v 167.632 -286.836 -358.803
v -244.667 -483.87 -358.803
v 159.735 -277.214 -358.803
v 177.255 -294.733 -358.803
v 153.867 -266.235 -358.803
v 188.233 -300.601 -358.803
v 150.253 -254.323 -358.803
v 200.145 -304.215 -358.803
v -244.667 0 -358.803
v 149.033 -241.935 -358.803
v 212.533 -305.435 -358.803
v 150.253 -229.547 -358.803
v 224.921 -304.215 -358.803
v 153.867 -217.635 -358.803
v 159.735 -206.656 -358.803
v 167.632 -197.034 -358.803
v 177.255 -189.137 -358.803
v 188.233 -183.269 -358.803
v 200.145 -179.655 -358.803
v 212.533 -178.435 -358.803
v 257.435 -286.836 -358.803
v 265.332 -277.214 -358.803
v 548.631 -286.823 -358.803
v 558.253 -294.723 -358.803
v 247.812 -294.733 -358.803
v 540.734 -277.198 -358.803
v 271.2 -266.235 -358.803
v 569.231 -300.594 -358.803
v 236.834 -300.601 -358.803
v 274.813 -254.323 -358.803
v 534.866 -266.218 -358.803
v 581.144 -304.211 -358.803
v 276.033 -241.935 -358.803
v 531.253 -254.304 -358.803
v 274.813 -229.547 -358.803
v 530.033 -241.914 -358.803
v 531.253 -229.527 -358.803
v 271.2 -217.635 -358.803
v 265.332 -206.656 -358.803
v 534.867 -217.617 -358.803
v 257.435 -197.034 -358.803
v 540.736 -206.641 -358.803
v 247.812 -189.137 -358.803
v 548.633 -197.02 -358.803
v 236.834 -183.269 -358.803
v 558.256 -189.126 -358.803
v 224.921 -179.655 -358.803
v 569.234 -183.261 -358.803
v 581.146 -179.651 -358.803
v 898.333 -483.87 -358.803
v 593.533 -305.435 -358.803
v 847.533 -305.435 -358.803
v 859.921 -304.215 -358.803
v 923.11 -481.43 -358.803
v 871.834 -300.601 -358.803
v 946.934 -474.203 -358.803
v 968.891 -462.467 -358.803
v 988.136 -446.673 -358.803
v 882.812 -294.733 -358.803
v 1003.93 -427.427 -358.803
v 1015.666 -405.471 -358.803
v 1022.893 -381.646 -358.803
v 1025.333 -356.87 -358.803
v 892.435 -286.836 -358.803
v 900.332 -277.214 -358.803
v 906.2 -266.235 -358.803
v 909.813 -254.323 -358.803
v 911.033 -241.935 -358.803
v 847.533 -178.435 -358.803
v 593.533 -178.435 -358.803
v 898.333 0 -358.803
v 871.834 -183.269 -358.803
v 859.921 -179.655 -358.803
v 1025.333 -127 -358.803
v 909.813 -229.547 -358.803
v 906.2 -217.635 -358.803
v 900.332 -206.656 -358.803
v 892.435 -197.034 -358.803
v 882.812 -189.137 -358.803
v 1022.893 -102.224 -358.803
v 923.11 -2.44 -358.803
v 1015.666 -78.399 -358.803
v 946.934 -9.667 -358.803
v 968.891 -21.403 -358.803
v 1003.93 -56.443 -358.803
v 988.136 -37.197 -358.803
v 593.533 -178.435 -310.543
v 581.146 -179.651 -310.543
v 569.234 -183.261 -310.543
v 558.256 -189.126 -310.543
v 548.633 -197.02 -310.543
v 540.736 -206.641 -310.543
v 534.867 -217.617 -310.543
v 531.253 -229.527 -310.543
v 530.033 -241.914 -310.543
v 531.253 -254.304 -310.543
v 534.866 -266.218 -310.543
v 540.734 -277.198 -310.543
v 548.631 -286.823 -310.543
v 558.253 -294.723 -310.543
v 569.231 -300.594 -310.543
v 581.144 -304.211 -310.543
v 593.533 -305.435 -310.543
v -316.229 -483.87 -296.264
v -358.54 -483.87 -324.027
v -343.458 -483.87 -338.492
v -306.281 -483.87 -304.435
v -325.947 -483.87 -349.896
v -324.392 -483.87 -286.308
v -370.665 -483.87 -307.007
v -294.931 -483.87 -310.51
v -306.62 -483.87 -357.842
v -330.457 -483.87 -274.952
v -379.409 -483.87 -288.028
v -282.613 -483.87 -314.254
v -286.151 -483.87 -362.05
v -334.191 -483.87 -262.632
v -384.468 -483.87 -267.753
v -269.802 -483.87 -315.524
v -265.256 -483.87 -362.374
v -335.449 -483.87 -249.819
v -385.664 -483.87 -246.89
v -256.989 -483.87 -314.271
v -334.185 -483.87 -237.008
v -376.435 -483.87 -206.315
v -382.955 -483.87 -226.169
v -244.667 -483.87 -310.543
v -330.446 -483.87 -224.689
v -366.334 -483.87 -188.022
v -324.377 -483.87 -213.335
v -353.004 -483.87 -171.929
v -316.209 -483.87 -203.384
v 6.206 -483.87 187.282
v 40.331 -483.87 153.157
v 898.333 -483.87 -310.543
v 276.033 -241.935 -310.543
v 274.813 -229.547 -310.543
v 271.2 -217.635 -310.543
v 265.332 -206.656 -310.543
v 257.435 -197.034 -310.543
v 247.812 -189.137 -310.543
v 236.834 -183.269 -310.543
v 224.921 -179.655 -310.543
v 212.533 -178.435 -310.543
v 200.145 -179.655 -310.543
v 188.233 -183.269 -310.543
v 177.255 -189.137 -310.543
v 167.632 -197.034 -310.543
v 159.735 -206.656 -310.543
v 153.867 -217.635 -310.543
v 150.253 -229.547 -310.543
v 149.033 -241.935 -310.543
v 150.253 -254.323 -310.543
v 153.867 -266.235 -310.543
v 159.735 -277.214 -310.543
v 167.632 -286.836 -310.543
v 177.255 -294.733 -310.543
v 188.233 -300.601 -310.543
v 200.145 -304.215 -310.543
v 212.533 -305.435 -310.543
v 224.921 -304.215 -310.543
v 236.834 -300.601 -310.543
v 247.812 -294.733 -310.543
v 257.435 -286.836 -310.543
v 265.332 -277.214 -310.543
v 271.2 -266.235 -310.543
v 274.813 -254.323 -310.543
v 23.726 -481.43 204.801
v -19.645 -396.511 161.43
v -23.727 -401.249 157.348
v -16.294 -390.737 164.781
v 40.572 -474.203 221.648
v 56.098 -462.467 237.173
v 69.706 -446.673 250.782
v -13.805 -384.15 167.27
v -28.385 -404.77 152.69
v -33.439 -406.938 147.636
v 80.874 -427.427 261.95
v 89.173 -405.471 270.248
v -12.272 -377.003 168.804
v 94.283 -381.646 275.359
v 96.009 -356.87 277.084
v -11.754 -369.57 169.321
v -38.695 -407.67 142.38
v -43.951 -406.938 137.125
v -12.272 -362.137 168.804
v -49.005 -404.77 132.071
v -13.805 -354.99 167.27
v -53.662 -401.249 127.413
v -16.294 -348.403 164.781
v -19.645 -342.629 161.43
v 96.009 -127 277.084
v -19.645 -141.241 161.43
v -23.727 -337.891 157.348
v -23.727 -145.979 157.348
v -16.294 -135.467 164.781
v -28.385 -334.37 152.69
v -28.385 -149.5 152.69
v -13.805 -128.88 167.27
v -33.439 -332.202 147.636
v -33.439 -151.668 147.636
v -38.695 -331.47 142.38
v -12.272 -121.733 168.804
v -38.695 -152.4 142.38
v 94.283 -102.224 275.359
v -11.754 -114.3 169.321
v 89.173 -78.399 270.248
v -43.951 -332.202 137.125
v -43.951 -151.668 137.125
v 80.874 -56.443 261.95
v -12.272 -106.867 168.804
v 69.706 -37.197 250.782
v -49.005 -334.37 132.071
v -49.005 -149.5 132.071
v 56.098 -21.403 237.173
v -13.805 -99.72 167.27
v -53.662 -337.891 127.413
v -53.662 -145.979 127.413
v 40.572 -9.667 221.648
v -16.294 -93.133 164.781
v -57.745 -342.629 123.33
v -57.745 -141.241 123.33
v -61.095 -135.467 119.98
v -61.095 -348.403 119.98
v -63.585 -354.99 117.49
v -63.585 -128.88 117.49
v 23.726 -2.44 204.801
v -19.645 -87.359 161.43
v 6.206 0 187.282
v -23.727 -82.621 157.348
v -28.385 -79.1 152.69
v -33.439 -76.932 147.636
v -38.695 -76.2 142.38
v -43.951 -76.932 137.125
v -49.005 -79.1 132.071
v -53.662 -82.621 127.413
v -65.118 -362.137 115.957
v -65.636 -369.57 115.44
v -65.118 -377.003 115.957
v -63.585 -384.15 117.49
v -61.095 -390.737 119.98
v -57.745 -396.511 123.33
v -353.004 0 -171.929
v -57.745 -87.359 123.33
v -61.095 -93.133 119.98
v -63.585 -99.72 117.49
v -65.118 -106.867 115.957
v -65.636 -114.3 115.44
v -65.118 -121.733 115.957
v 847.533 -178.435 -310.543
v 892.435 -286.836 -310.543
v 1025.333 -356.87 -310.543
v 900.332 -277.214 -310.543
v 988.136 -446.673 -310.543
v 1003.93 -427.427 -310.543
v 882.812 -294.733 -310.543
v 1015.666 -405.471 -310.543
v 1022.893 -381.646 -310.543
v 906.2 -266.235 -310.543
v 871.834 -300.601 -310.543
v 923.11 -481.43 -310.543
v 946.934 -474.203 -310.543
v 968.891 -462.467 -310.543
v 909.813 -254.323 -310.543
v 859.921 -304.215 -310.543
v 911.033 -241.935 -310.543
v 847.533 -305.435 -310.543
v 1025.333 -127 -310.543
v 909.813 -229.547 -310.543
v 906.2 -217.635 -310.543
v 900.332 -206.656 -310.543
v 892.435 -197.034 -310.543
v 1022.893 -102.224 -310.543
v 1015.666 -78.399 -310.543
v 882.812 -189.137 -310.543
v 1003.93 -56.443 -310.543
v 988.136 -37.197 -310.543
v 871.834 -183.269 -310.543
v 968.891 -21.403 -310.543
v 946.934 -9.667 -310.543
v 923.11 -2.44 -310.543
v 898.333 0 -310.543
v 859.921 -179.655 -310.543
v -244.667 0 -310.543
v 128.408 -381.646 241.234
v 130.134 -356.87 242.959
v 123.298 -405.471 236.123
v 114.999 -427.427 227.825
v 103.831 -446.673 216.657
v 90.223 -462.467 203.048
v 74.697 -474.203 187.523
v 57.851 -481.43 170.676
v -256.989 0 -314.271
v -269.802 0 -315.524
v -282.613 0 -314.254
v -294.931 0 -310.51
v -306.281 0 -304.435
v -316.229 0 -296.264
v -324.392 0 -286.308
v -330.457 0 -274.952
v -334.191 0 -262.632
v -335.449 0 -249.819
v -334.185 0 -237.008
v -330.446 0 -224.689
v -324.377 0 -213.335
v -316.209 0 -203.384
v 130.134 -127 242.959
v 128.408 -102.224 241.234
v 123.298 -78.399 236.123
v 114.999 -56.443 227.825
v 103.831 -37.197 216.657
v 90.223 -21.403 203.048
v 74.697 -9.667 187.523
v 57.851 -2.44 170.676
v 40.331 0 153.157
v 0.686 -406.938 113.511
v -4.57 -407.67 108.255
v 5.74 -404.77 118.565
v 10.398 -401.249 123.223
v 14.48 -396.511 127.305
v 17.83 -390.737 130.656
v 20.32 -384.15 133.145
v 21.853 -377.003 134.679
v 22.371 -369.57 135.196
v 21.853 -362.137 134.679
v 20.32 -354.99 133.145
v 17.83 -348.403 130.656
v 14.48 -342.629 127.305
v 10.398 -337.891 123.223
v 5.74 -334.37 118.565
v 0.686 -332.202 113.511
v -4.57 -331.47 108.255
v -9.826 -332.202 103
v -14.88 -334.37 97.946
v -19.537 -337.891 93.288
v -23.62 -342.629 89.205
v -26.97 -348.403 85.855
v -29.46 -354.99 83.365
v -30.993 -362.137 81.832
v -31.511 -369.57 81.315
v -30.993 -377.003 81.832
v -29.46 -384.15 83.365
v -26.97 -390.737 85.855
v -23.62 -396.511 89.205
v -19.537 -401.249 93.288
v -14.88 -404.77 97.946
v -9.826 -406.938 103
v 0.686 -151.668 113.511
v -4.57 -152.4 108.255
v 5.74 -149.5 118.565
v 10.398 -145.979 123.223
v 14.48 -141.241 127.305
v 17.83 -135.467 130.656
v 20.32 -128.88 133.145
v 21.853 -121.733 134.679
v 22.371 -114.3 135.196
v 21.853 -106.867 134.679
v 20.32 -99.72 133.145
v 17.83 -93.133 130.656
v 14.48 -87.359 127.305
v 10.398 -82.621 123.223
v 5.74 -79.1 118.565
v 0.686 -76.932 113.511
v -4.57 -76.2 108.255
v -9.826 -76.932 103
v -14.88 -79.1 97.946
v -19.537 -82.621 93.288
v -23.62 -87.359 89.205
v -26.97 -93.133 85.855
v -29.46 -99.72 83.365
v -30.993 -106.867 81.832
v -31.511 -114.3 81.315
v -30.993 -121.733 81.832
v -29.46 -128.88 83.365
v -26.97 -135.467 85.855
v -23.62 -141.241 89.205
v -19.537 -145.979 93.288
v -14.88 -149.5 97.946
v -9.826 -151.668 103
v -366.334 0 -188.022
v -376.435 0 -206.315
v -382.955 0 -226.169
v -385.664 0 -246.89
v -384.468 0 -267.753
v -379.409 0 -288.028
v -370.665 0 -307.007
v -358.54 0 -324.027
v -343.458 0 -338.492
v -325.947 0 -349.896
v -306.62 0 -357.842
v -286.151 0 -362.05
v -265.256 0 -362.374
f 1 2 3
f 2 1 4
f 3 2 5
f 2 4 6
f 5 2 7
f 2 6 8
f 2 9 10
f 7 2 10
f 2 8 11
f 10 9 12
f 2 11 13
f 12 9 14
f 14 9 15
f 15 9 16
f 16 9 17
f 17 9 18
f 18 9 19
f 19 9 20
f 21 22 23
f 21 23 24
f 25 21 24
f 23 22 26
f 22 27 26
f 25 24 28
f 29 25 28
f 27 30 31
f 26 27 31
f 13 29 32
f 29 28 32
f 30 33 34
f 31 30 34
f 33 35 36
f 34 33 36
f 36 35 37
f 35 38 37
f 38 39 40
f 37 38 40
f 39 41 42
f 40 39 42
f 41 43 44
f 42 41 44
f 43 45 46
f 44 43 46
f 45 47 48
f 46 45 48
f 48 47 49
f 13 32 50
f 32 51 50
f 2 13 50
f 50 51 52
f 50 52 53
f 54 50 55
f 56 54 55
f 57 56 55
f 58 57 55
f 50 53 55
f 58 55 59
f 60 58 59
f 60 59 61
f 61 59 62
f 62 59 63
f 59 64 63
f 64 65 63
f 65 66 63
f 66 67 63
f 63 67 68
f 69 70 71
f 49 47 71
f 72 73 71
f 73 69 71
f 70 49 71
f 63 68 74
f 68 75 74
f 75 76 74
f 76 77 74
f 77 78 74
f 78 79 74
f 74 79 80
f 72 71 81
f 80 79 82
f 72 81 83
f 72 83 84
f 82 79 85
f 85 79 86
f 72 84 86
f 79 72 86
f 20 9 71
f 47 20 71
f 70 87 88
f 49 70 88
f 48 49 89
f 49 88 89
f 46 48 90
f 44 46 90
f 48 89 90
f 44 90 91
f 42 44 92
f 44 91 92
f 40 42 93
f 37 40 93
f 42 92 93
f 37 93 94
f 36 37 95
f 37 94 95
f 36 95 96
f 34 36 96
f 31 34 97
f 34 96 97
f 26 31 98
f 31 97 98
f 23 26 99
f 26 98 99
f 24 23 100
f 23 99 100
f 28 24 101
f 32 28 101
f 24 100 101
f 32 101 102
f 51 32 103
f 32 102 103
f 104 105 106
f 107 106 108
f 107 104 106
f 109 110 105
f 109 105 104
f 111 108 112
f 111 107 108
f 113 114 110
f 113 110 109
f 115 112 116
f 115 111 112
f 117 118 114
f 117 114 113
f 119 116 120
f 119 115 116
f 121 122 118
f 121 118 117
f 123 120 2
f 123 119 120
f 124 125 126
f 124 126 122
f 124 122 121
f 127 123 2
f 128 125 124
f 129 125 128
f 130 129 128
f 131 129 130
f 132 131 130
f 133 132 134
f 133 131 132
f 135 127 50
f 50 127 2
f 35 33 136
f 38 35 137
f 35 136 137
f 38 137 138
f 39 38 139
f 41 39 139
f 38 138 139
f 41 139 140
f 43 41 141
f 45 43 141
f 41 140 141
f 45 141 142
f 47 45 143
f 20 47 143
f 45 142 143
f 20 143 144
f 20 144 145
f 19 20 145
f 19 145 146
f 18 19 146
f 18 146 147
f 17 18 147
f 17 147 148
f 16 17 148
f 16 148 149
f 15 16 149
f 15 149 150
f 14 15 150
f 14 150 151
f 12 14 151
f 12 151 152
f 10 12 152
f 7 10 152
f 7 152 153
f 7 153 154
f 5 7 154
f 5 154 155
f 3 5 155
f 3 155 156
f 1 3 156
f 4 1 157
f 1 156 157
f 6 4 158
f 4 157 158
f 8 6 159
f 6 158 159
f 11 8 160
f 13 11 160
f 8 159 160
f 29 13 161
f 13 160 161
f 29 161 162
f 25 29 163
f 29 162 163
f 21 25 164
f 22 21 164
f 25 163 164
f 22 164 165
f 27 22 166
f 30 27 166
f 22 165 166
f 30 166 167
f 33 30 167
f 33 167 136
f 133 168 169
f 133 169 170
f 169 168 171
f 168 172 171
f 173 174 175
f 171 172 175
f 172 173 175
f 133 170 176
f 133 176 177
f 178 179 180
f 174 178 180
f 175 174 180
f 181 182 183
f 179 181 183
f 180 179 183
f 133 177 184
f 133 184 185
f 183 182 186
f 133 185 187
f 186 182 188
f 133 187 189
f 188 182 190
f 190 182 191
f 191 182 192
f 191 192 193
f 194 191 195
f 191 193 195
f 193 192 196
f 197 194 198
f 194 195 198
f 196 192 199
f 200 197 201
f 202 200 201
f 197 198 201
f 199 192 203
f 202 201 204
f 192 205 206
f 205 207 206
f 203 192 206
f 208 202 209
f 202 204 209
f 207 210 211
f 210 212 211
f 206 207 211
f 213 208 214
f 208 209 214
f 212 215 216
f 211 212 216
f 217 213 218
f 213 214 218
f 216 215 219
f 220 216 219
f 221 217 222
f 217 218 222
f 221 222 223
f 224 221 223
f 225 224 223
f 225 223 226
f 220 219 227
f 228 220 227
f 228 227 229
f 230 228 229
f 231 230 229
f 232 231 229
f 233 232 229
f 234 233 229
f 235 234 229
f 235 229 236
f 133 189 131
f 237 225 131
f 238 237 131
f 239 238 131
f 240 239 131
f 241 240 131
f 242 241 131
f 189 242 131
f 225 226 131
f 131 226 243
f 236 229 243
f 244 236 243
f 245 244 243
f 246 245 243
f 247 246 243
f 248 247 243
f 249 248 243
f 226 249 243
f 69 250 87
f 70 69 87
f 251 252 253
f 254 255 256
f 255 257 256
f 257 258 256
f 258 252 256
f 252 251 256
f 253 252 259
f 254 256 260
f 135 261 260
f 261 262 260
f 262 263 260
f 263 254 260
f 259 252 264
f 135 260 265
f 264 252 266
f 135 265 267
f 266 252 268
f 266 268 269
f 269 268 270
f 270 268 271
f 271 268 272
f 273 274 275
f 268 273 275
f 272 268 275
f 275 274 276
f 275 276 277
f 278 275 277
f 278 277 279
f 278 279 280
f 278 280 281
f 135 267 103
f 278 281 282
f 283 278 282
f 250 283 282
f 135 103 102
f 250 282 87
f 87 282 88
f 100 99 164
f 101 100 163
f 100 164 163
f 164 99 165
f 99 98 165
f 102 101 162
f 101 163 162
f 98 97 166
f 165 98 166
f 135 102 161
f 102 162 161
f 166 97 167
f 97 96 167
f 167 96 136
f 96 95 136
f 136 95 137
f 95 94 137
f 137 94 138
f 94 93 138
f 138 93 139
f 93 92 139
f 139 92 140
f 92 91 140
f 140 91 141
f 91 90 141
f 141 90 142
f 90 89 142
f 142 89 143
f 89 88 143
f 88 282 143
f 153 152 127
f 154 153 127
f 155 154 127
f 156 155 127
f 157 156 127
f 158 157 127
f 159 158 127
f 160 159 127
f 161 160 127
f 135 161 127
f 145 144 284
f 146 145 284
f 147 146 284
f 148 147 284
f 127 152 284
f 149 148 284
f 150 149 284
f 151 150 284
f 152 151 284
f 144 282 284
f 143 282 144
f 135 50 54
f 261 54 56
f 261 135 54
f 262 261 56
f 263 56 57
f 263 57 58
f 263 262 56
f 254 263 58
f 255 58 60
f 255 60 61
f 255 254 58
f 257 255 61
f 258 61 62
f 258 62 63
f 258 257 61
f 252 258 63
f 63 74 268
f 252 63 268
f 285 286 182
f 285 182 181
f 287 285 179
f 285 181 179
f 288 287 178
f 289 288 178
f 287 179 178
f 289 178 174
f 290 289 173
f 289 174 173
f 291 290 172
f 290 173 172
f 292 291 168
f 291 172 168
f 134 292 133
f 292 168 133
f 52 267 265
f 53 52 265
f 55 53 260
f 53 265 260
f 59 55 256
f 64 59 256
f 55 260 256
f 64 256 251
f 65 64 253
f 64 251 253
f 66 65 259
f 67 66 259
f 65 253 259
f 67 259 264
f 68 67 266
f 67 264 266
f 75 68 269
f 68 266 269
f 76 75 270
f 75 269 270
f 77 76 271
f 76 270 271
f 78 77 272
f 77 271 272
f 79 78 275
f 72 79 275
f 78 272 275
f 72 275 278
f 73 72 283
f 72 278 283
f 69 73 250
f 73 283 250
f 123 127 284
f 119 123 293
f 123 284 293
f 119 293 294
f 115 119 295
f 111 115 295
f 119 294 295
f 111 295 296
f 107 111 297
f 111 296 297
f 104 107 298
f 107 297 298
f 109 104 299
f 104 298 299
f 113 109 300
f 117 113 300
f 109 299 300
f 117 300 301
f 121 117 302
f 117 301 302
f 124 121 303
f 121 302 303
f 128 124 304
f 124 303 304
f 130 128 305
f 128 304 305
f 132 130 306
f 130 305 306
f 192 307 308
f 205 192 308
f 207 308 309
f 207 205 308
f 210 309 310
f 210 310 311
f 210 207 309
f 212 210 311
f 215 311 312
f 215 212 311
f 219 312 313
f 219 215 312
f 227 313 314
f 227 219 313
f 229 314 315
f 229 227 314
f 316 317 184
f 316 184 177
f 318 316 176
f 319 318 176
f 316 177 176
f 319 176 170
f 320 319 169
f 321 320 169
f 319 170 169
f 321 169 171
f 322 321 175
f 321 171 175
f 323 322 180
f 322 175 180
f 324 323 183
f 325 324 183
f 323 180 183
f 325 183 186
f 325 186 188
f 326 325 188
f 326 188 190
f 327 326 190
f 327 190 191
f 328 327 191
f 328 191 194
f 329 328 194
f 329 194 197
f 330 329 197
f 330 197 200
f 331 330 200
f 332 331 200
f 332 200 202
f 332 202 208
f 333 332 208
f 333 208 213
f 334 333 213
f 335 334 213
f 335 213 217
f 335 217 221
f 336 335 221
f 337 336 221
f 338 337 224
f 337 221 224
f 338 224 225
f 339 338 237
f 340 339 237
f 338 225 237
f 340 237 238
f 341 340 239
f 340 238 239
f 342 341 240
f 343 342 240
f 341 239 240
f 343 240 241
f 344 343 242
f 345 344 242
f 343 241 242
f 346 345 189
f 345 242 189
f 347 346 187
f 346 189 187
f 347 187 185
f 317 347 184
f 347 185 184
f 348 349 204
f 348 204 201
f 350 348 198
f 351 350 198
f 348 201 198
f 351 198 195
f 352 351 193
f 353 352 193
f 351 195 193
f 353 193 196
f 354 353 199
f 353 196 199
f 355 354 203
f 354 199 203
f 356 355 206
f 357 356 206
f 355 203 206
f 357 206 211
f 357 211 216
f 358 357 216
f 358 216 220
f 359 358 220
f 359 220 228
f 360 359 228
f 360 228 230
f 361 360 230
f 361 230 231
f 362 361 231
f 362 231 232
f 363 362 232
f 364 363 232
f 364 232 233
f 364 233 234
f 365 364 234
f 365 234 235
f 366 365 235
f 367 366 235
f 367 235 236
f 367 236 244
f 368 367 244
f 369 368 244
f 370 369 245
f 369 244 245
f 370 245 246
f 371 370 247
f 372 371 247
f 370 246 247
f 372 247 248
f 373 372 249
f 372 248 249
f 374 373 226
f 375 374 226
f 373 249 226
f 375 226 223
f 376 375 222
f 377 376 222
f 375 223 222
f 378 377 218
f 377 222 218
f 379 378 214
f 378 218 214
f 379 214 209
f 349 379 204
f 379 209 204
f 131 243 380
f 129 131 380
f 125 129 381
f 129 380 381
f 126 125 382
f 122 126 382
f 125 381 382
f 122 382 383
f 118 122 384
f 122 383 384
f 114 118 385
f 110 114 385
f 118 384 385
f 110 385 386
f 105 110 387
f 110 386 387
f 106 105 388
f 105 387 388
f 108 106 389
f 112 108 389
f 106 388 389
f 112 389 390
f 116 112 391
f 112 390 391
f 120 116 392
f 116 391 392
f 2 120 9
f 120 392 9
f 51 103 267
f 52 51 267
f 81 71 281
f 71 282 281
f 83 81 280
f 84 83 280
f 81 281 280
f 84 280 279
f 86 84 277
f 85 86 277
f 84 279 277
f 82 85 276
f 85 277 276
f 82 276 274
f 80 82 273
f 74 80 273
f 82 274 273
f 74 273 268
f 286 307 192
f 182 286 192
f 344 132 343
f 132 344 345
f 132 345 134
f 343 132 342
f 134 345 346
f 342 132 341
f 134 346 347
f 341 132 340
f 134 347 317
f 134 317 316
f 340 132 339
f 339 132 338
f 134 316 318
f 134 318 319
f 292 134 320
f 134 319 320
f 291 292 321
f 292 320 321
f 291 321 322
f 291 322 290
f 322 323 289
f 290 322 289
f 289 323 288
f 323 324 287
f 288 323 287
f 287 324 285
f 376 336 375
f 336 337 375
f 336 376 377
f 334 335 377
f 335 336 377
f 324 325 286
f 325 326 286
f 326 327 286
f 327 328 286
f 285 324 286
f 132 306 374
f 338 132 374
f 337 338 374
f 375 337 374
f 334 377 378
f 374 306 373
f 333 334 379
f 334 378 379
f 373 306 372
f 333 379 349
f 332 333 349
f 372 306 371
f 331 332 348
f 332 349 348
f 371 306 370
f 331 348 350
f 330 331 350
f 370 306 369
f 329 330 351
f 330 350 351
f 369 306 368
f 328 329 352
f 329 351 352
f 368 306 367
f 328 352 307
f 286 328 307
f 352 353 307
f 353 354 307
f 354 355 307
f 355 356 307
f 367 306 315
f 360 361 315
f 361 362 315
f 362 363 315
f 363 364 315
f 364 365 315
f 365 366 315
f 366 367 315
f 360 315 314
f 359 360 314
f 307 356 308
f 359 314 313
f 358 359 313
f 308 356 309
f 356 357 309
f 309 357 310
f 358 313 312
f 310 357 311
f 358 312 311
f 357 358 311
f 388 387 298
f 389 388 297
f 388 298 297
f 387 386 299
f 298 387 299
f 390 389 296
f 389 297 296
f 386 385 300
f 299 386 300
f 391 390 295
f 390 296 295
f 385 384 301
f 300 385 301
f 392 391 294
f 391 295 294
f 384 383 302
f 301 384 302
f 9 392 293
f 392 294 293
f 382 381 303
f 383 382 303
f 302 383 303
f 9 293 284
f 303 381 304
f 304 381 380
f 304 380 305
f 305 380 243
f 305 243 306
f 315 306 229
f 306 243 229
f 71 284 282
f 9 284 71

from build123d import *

# Parameters (mm, degrees)
F1_DEPTH = 483.87
F2_R     = 63.5
F3_DEPTH = 52.173089771
F4_R     = 38.1
F5_DEPTH = 50.8
F6_R     = 127
F7_R     = 127
F8_DEPTH = 52.173089771


with BuildPart() as f1:
    # F0 (on Front) → F1 (new body)
    with BuildSketch(Plane.XZ):
        with BuildLine():
            Line((130.1338967539, 242.9592923321), (96.0089234939, 277.0842655921))
            Line((96.0089234939, 277.0842655921), (-353.0038825596, -171.9285404613))
            ThreePointArc((-353.0038825596, -171.9285404613), (-370.6647202624, -307.0074831479), (-244.6667798626, -358.8027045558))
            Line((-244.6667798626, -358.8027045558), (1025.3332201374, -358.8027045558))
            Line((1025.3332201374, -358.8027045558), (1025.3332201374, -310.5427045558))
            Line((1025.3332201374, -310.5427045558), (-244.6667798626, -310.5427045558))
            ThreePointArc((-244.6667798626, -310.5427045558), (-324.3924314451, -286.3084555707), (-316.2091160387, -203.3837204605))
            Line((-316.2091160387, -203.3837204605), (130.1338967539, 242.9592923321))
        make_face()
    extrude(amount=F1_DEPTH)

    # F2 (on face) → F3 (cut, through all)
    with BuildSketch(Plane.XY.offset(-310.5427045558)):
        with Locations((212.5332201374, -241.935)):
            Circle(F2_R)
    extrude(amount=-F3_DEPTH, mode=Mode.SUBTRACT)

    # F4 (on face) → F5 (cut)
    with BuildSketch(Plane(origin=(-90.5376710491, 0, 90.5376710491), x_dir=(0, -1, 0), z_dir=(-0.7071067812, 0, 0.7071067812))):
        with Locations((114.3, 73.3167240172)):
            Circle(F4_R)
        with Locations((369.57, 73.3167240172)):
            Circle(F4_R)
    extrude(amount=-F5_DEPTH, mode=Mode.SUBTRACT)

    # F6
    f6_edges = [f1.edges().sort_by_distance(p)[0] for p in [
        (113.07141, 0, 260.021779),
        (113.07141, -483.87, 260.021779),
    ]]
    fillet(f6_edges, radius=F6_R)

    # F7
    f7_edges = [f1.edges().sort_by_distance(p)[0] for p in [
        (1025.33322, 0, -334.672705),
        (1025.33322, -483.87, -334.672705),
    ]]
    fillet(f7_edges, radius=F7_R)

    # F2 (on face) → F8 (cut, through all)
    with BuildSketch(Plane.XY.offset(-310.5427045558)):
        with BuildLine():
            Line((847.5332201374, -178.435), (593.5332201374, -178.435))
            ThreePointArc((593.5332201374, -178.435), (548.6332037777, -197.0202501392), (530.0332201374, -241.914165099))
            ThreePointArc((530.0332201374, -241.914165099), (548.6306760802, -286.8228125584), (593.5332201374, -305.435))
            Line((593.5332201374, -305.435), (847.5332201374, -305.435))
            ThreePointArc((847.5332201374, -305.435), (892.4345007428, -286.8362806053), (911.0332201374, -241.935))
            ThreePointArc((911.0332201374, -241.935), (892.4345007428, -197.0337193947), (847.5332201374, -178.435))
        make_face()
    extrude(amount=-F8_DEPTH, mode=Mode.SUBTRACT)


solid = f1.part
